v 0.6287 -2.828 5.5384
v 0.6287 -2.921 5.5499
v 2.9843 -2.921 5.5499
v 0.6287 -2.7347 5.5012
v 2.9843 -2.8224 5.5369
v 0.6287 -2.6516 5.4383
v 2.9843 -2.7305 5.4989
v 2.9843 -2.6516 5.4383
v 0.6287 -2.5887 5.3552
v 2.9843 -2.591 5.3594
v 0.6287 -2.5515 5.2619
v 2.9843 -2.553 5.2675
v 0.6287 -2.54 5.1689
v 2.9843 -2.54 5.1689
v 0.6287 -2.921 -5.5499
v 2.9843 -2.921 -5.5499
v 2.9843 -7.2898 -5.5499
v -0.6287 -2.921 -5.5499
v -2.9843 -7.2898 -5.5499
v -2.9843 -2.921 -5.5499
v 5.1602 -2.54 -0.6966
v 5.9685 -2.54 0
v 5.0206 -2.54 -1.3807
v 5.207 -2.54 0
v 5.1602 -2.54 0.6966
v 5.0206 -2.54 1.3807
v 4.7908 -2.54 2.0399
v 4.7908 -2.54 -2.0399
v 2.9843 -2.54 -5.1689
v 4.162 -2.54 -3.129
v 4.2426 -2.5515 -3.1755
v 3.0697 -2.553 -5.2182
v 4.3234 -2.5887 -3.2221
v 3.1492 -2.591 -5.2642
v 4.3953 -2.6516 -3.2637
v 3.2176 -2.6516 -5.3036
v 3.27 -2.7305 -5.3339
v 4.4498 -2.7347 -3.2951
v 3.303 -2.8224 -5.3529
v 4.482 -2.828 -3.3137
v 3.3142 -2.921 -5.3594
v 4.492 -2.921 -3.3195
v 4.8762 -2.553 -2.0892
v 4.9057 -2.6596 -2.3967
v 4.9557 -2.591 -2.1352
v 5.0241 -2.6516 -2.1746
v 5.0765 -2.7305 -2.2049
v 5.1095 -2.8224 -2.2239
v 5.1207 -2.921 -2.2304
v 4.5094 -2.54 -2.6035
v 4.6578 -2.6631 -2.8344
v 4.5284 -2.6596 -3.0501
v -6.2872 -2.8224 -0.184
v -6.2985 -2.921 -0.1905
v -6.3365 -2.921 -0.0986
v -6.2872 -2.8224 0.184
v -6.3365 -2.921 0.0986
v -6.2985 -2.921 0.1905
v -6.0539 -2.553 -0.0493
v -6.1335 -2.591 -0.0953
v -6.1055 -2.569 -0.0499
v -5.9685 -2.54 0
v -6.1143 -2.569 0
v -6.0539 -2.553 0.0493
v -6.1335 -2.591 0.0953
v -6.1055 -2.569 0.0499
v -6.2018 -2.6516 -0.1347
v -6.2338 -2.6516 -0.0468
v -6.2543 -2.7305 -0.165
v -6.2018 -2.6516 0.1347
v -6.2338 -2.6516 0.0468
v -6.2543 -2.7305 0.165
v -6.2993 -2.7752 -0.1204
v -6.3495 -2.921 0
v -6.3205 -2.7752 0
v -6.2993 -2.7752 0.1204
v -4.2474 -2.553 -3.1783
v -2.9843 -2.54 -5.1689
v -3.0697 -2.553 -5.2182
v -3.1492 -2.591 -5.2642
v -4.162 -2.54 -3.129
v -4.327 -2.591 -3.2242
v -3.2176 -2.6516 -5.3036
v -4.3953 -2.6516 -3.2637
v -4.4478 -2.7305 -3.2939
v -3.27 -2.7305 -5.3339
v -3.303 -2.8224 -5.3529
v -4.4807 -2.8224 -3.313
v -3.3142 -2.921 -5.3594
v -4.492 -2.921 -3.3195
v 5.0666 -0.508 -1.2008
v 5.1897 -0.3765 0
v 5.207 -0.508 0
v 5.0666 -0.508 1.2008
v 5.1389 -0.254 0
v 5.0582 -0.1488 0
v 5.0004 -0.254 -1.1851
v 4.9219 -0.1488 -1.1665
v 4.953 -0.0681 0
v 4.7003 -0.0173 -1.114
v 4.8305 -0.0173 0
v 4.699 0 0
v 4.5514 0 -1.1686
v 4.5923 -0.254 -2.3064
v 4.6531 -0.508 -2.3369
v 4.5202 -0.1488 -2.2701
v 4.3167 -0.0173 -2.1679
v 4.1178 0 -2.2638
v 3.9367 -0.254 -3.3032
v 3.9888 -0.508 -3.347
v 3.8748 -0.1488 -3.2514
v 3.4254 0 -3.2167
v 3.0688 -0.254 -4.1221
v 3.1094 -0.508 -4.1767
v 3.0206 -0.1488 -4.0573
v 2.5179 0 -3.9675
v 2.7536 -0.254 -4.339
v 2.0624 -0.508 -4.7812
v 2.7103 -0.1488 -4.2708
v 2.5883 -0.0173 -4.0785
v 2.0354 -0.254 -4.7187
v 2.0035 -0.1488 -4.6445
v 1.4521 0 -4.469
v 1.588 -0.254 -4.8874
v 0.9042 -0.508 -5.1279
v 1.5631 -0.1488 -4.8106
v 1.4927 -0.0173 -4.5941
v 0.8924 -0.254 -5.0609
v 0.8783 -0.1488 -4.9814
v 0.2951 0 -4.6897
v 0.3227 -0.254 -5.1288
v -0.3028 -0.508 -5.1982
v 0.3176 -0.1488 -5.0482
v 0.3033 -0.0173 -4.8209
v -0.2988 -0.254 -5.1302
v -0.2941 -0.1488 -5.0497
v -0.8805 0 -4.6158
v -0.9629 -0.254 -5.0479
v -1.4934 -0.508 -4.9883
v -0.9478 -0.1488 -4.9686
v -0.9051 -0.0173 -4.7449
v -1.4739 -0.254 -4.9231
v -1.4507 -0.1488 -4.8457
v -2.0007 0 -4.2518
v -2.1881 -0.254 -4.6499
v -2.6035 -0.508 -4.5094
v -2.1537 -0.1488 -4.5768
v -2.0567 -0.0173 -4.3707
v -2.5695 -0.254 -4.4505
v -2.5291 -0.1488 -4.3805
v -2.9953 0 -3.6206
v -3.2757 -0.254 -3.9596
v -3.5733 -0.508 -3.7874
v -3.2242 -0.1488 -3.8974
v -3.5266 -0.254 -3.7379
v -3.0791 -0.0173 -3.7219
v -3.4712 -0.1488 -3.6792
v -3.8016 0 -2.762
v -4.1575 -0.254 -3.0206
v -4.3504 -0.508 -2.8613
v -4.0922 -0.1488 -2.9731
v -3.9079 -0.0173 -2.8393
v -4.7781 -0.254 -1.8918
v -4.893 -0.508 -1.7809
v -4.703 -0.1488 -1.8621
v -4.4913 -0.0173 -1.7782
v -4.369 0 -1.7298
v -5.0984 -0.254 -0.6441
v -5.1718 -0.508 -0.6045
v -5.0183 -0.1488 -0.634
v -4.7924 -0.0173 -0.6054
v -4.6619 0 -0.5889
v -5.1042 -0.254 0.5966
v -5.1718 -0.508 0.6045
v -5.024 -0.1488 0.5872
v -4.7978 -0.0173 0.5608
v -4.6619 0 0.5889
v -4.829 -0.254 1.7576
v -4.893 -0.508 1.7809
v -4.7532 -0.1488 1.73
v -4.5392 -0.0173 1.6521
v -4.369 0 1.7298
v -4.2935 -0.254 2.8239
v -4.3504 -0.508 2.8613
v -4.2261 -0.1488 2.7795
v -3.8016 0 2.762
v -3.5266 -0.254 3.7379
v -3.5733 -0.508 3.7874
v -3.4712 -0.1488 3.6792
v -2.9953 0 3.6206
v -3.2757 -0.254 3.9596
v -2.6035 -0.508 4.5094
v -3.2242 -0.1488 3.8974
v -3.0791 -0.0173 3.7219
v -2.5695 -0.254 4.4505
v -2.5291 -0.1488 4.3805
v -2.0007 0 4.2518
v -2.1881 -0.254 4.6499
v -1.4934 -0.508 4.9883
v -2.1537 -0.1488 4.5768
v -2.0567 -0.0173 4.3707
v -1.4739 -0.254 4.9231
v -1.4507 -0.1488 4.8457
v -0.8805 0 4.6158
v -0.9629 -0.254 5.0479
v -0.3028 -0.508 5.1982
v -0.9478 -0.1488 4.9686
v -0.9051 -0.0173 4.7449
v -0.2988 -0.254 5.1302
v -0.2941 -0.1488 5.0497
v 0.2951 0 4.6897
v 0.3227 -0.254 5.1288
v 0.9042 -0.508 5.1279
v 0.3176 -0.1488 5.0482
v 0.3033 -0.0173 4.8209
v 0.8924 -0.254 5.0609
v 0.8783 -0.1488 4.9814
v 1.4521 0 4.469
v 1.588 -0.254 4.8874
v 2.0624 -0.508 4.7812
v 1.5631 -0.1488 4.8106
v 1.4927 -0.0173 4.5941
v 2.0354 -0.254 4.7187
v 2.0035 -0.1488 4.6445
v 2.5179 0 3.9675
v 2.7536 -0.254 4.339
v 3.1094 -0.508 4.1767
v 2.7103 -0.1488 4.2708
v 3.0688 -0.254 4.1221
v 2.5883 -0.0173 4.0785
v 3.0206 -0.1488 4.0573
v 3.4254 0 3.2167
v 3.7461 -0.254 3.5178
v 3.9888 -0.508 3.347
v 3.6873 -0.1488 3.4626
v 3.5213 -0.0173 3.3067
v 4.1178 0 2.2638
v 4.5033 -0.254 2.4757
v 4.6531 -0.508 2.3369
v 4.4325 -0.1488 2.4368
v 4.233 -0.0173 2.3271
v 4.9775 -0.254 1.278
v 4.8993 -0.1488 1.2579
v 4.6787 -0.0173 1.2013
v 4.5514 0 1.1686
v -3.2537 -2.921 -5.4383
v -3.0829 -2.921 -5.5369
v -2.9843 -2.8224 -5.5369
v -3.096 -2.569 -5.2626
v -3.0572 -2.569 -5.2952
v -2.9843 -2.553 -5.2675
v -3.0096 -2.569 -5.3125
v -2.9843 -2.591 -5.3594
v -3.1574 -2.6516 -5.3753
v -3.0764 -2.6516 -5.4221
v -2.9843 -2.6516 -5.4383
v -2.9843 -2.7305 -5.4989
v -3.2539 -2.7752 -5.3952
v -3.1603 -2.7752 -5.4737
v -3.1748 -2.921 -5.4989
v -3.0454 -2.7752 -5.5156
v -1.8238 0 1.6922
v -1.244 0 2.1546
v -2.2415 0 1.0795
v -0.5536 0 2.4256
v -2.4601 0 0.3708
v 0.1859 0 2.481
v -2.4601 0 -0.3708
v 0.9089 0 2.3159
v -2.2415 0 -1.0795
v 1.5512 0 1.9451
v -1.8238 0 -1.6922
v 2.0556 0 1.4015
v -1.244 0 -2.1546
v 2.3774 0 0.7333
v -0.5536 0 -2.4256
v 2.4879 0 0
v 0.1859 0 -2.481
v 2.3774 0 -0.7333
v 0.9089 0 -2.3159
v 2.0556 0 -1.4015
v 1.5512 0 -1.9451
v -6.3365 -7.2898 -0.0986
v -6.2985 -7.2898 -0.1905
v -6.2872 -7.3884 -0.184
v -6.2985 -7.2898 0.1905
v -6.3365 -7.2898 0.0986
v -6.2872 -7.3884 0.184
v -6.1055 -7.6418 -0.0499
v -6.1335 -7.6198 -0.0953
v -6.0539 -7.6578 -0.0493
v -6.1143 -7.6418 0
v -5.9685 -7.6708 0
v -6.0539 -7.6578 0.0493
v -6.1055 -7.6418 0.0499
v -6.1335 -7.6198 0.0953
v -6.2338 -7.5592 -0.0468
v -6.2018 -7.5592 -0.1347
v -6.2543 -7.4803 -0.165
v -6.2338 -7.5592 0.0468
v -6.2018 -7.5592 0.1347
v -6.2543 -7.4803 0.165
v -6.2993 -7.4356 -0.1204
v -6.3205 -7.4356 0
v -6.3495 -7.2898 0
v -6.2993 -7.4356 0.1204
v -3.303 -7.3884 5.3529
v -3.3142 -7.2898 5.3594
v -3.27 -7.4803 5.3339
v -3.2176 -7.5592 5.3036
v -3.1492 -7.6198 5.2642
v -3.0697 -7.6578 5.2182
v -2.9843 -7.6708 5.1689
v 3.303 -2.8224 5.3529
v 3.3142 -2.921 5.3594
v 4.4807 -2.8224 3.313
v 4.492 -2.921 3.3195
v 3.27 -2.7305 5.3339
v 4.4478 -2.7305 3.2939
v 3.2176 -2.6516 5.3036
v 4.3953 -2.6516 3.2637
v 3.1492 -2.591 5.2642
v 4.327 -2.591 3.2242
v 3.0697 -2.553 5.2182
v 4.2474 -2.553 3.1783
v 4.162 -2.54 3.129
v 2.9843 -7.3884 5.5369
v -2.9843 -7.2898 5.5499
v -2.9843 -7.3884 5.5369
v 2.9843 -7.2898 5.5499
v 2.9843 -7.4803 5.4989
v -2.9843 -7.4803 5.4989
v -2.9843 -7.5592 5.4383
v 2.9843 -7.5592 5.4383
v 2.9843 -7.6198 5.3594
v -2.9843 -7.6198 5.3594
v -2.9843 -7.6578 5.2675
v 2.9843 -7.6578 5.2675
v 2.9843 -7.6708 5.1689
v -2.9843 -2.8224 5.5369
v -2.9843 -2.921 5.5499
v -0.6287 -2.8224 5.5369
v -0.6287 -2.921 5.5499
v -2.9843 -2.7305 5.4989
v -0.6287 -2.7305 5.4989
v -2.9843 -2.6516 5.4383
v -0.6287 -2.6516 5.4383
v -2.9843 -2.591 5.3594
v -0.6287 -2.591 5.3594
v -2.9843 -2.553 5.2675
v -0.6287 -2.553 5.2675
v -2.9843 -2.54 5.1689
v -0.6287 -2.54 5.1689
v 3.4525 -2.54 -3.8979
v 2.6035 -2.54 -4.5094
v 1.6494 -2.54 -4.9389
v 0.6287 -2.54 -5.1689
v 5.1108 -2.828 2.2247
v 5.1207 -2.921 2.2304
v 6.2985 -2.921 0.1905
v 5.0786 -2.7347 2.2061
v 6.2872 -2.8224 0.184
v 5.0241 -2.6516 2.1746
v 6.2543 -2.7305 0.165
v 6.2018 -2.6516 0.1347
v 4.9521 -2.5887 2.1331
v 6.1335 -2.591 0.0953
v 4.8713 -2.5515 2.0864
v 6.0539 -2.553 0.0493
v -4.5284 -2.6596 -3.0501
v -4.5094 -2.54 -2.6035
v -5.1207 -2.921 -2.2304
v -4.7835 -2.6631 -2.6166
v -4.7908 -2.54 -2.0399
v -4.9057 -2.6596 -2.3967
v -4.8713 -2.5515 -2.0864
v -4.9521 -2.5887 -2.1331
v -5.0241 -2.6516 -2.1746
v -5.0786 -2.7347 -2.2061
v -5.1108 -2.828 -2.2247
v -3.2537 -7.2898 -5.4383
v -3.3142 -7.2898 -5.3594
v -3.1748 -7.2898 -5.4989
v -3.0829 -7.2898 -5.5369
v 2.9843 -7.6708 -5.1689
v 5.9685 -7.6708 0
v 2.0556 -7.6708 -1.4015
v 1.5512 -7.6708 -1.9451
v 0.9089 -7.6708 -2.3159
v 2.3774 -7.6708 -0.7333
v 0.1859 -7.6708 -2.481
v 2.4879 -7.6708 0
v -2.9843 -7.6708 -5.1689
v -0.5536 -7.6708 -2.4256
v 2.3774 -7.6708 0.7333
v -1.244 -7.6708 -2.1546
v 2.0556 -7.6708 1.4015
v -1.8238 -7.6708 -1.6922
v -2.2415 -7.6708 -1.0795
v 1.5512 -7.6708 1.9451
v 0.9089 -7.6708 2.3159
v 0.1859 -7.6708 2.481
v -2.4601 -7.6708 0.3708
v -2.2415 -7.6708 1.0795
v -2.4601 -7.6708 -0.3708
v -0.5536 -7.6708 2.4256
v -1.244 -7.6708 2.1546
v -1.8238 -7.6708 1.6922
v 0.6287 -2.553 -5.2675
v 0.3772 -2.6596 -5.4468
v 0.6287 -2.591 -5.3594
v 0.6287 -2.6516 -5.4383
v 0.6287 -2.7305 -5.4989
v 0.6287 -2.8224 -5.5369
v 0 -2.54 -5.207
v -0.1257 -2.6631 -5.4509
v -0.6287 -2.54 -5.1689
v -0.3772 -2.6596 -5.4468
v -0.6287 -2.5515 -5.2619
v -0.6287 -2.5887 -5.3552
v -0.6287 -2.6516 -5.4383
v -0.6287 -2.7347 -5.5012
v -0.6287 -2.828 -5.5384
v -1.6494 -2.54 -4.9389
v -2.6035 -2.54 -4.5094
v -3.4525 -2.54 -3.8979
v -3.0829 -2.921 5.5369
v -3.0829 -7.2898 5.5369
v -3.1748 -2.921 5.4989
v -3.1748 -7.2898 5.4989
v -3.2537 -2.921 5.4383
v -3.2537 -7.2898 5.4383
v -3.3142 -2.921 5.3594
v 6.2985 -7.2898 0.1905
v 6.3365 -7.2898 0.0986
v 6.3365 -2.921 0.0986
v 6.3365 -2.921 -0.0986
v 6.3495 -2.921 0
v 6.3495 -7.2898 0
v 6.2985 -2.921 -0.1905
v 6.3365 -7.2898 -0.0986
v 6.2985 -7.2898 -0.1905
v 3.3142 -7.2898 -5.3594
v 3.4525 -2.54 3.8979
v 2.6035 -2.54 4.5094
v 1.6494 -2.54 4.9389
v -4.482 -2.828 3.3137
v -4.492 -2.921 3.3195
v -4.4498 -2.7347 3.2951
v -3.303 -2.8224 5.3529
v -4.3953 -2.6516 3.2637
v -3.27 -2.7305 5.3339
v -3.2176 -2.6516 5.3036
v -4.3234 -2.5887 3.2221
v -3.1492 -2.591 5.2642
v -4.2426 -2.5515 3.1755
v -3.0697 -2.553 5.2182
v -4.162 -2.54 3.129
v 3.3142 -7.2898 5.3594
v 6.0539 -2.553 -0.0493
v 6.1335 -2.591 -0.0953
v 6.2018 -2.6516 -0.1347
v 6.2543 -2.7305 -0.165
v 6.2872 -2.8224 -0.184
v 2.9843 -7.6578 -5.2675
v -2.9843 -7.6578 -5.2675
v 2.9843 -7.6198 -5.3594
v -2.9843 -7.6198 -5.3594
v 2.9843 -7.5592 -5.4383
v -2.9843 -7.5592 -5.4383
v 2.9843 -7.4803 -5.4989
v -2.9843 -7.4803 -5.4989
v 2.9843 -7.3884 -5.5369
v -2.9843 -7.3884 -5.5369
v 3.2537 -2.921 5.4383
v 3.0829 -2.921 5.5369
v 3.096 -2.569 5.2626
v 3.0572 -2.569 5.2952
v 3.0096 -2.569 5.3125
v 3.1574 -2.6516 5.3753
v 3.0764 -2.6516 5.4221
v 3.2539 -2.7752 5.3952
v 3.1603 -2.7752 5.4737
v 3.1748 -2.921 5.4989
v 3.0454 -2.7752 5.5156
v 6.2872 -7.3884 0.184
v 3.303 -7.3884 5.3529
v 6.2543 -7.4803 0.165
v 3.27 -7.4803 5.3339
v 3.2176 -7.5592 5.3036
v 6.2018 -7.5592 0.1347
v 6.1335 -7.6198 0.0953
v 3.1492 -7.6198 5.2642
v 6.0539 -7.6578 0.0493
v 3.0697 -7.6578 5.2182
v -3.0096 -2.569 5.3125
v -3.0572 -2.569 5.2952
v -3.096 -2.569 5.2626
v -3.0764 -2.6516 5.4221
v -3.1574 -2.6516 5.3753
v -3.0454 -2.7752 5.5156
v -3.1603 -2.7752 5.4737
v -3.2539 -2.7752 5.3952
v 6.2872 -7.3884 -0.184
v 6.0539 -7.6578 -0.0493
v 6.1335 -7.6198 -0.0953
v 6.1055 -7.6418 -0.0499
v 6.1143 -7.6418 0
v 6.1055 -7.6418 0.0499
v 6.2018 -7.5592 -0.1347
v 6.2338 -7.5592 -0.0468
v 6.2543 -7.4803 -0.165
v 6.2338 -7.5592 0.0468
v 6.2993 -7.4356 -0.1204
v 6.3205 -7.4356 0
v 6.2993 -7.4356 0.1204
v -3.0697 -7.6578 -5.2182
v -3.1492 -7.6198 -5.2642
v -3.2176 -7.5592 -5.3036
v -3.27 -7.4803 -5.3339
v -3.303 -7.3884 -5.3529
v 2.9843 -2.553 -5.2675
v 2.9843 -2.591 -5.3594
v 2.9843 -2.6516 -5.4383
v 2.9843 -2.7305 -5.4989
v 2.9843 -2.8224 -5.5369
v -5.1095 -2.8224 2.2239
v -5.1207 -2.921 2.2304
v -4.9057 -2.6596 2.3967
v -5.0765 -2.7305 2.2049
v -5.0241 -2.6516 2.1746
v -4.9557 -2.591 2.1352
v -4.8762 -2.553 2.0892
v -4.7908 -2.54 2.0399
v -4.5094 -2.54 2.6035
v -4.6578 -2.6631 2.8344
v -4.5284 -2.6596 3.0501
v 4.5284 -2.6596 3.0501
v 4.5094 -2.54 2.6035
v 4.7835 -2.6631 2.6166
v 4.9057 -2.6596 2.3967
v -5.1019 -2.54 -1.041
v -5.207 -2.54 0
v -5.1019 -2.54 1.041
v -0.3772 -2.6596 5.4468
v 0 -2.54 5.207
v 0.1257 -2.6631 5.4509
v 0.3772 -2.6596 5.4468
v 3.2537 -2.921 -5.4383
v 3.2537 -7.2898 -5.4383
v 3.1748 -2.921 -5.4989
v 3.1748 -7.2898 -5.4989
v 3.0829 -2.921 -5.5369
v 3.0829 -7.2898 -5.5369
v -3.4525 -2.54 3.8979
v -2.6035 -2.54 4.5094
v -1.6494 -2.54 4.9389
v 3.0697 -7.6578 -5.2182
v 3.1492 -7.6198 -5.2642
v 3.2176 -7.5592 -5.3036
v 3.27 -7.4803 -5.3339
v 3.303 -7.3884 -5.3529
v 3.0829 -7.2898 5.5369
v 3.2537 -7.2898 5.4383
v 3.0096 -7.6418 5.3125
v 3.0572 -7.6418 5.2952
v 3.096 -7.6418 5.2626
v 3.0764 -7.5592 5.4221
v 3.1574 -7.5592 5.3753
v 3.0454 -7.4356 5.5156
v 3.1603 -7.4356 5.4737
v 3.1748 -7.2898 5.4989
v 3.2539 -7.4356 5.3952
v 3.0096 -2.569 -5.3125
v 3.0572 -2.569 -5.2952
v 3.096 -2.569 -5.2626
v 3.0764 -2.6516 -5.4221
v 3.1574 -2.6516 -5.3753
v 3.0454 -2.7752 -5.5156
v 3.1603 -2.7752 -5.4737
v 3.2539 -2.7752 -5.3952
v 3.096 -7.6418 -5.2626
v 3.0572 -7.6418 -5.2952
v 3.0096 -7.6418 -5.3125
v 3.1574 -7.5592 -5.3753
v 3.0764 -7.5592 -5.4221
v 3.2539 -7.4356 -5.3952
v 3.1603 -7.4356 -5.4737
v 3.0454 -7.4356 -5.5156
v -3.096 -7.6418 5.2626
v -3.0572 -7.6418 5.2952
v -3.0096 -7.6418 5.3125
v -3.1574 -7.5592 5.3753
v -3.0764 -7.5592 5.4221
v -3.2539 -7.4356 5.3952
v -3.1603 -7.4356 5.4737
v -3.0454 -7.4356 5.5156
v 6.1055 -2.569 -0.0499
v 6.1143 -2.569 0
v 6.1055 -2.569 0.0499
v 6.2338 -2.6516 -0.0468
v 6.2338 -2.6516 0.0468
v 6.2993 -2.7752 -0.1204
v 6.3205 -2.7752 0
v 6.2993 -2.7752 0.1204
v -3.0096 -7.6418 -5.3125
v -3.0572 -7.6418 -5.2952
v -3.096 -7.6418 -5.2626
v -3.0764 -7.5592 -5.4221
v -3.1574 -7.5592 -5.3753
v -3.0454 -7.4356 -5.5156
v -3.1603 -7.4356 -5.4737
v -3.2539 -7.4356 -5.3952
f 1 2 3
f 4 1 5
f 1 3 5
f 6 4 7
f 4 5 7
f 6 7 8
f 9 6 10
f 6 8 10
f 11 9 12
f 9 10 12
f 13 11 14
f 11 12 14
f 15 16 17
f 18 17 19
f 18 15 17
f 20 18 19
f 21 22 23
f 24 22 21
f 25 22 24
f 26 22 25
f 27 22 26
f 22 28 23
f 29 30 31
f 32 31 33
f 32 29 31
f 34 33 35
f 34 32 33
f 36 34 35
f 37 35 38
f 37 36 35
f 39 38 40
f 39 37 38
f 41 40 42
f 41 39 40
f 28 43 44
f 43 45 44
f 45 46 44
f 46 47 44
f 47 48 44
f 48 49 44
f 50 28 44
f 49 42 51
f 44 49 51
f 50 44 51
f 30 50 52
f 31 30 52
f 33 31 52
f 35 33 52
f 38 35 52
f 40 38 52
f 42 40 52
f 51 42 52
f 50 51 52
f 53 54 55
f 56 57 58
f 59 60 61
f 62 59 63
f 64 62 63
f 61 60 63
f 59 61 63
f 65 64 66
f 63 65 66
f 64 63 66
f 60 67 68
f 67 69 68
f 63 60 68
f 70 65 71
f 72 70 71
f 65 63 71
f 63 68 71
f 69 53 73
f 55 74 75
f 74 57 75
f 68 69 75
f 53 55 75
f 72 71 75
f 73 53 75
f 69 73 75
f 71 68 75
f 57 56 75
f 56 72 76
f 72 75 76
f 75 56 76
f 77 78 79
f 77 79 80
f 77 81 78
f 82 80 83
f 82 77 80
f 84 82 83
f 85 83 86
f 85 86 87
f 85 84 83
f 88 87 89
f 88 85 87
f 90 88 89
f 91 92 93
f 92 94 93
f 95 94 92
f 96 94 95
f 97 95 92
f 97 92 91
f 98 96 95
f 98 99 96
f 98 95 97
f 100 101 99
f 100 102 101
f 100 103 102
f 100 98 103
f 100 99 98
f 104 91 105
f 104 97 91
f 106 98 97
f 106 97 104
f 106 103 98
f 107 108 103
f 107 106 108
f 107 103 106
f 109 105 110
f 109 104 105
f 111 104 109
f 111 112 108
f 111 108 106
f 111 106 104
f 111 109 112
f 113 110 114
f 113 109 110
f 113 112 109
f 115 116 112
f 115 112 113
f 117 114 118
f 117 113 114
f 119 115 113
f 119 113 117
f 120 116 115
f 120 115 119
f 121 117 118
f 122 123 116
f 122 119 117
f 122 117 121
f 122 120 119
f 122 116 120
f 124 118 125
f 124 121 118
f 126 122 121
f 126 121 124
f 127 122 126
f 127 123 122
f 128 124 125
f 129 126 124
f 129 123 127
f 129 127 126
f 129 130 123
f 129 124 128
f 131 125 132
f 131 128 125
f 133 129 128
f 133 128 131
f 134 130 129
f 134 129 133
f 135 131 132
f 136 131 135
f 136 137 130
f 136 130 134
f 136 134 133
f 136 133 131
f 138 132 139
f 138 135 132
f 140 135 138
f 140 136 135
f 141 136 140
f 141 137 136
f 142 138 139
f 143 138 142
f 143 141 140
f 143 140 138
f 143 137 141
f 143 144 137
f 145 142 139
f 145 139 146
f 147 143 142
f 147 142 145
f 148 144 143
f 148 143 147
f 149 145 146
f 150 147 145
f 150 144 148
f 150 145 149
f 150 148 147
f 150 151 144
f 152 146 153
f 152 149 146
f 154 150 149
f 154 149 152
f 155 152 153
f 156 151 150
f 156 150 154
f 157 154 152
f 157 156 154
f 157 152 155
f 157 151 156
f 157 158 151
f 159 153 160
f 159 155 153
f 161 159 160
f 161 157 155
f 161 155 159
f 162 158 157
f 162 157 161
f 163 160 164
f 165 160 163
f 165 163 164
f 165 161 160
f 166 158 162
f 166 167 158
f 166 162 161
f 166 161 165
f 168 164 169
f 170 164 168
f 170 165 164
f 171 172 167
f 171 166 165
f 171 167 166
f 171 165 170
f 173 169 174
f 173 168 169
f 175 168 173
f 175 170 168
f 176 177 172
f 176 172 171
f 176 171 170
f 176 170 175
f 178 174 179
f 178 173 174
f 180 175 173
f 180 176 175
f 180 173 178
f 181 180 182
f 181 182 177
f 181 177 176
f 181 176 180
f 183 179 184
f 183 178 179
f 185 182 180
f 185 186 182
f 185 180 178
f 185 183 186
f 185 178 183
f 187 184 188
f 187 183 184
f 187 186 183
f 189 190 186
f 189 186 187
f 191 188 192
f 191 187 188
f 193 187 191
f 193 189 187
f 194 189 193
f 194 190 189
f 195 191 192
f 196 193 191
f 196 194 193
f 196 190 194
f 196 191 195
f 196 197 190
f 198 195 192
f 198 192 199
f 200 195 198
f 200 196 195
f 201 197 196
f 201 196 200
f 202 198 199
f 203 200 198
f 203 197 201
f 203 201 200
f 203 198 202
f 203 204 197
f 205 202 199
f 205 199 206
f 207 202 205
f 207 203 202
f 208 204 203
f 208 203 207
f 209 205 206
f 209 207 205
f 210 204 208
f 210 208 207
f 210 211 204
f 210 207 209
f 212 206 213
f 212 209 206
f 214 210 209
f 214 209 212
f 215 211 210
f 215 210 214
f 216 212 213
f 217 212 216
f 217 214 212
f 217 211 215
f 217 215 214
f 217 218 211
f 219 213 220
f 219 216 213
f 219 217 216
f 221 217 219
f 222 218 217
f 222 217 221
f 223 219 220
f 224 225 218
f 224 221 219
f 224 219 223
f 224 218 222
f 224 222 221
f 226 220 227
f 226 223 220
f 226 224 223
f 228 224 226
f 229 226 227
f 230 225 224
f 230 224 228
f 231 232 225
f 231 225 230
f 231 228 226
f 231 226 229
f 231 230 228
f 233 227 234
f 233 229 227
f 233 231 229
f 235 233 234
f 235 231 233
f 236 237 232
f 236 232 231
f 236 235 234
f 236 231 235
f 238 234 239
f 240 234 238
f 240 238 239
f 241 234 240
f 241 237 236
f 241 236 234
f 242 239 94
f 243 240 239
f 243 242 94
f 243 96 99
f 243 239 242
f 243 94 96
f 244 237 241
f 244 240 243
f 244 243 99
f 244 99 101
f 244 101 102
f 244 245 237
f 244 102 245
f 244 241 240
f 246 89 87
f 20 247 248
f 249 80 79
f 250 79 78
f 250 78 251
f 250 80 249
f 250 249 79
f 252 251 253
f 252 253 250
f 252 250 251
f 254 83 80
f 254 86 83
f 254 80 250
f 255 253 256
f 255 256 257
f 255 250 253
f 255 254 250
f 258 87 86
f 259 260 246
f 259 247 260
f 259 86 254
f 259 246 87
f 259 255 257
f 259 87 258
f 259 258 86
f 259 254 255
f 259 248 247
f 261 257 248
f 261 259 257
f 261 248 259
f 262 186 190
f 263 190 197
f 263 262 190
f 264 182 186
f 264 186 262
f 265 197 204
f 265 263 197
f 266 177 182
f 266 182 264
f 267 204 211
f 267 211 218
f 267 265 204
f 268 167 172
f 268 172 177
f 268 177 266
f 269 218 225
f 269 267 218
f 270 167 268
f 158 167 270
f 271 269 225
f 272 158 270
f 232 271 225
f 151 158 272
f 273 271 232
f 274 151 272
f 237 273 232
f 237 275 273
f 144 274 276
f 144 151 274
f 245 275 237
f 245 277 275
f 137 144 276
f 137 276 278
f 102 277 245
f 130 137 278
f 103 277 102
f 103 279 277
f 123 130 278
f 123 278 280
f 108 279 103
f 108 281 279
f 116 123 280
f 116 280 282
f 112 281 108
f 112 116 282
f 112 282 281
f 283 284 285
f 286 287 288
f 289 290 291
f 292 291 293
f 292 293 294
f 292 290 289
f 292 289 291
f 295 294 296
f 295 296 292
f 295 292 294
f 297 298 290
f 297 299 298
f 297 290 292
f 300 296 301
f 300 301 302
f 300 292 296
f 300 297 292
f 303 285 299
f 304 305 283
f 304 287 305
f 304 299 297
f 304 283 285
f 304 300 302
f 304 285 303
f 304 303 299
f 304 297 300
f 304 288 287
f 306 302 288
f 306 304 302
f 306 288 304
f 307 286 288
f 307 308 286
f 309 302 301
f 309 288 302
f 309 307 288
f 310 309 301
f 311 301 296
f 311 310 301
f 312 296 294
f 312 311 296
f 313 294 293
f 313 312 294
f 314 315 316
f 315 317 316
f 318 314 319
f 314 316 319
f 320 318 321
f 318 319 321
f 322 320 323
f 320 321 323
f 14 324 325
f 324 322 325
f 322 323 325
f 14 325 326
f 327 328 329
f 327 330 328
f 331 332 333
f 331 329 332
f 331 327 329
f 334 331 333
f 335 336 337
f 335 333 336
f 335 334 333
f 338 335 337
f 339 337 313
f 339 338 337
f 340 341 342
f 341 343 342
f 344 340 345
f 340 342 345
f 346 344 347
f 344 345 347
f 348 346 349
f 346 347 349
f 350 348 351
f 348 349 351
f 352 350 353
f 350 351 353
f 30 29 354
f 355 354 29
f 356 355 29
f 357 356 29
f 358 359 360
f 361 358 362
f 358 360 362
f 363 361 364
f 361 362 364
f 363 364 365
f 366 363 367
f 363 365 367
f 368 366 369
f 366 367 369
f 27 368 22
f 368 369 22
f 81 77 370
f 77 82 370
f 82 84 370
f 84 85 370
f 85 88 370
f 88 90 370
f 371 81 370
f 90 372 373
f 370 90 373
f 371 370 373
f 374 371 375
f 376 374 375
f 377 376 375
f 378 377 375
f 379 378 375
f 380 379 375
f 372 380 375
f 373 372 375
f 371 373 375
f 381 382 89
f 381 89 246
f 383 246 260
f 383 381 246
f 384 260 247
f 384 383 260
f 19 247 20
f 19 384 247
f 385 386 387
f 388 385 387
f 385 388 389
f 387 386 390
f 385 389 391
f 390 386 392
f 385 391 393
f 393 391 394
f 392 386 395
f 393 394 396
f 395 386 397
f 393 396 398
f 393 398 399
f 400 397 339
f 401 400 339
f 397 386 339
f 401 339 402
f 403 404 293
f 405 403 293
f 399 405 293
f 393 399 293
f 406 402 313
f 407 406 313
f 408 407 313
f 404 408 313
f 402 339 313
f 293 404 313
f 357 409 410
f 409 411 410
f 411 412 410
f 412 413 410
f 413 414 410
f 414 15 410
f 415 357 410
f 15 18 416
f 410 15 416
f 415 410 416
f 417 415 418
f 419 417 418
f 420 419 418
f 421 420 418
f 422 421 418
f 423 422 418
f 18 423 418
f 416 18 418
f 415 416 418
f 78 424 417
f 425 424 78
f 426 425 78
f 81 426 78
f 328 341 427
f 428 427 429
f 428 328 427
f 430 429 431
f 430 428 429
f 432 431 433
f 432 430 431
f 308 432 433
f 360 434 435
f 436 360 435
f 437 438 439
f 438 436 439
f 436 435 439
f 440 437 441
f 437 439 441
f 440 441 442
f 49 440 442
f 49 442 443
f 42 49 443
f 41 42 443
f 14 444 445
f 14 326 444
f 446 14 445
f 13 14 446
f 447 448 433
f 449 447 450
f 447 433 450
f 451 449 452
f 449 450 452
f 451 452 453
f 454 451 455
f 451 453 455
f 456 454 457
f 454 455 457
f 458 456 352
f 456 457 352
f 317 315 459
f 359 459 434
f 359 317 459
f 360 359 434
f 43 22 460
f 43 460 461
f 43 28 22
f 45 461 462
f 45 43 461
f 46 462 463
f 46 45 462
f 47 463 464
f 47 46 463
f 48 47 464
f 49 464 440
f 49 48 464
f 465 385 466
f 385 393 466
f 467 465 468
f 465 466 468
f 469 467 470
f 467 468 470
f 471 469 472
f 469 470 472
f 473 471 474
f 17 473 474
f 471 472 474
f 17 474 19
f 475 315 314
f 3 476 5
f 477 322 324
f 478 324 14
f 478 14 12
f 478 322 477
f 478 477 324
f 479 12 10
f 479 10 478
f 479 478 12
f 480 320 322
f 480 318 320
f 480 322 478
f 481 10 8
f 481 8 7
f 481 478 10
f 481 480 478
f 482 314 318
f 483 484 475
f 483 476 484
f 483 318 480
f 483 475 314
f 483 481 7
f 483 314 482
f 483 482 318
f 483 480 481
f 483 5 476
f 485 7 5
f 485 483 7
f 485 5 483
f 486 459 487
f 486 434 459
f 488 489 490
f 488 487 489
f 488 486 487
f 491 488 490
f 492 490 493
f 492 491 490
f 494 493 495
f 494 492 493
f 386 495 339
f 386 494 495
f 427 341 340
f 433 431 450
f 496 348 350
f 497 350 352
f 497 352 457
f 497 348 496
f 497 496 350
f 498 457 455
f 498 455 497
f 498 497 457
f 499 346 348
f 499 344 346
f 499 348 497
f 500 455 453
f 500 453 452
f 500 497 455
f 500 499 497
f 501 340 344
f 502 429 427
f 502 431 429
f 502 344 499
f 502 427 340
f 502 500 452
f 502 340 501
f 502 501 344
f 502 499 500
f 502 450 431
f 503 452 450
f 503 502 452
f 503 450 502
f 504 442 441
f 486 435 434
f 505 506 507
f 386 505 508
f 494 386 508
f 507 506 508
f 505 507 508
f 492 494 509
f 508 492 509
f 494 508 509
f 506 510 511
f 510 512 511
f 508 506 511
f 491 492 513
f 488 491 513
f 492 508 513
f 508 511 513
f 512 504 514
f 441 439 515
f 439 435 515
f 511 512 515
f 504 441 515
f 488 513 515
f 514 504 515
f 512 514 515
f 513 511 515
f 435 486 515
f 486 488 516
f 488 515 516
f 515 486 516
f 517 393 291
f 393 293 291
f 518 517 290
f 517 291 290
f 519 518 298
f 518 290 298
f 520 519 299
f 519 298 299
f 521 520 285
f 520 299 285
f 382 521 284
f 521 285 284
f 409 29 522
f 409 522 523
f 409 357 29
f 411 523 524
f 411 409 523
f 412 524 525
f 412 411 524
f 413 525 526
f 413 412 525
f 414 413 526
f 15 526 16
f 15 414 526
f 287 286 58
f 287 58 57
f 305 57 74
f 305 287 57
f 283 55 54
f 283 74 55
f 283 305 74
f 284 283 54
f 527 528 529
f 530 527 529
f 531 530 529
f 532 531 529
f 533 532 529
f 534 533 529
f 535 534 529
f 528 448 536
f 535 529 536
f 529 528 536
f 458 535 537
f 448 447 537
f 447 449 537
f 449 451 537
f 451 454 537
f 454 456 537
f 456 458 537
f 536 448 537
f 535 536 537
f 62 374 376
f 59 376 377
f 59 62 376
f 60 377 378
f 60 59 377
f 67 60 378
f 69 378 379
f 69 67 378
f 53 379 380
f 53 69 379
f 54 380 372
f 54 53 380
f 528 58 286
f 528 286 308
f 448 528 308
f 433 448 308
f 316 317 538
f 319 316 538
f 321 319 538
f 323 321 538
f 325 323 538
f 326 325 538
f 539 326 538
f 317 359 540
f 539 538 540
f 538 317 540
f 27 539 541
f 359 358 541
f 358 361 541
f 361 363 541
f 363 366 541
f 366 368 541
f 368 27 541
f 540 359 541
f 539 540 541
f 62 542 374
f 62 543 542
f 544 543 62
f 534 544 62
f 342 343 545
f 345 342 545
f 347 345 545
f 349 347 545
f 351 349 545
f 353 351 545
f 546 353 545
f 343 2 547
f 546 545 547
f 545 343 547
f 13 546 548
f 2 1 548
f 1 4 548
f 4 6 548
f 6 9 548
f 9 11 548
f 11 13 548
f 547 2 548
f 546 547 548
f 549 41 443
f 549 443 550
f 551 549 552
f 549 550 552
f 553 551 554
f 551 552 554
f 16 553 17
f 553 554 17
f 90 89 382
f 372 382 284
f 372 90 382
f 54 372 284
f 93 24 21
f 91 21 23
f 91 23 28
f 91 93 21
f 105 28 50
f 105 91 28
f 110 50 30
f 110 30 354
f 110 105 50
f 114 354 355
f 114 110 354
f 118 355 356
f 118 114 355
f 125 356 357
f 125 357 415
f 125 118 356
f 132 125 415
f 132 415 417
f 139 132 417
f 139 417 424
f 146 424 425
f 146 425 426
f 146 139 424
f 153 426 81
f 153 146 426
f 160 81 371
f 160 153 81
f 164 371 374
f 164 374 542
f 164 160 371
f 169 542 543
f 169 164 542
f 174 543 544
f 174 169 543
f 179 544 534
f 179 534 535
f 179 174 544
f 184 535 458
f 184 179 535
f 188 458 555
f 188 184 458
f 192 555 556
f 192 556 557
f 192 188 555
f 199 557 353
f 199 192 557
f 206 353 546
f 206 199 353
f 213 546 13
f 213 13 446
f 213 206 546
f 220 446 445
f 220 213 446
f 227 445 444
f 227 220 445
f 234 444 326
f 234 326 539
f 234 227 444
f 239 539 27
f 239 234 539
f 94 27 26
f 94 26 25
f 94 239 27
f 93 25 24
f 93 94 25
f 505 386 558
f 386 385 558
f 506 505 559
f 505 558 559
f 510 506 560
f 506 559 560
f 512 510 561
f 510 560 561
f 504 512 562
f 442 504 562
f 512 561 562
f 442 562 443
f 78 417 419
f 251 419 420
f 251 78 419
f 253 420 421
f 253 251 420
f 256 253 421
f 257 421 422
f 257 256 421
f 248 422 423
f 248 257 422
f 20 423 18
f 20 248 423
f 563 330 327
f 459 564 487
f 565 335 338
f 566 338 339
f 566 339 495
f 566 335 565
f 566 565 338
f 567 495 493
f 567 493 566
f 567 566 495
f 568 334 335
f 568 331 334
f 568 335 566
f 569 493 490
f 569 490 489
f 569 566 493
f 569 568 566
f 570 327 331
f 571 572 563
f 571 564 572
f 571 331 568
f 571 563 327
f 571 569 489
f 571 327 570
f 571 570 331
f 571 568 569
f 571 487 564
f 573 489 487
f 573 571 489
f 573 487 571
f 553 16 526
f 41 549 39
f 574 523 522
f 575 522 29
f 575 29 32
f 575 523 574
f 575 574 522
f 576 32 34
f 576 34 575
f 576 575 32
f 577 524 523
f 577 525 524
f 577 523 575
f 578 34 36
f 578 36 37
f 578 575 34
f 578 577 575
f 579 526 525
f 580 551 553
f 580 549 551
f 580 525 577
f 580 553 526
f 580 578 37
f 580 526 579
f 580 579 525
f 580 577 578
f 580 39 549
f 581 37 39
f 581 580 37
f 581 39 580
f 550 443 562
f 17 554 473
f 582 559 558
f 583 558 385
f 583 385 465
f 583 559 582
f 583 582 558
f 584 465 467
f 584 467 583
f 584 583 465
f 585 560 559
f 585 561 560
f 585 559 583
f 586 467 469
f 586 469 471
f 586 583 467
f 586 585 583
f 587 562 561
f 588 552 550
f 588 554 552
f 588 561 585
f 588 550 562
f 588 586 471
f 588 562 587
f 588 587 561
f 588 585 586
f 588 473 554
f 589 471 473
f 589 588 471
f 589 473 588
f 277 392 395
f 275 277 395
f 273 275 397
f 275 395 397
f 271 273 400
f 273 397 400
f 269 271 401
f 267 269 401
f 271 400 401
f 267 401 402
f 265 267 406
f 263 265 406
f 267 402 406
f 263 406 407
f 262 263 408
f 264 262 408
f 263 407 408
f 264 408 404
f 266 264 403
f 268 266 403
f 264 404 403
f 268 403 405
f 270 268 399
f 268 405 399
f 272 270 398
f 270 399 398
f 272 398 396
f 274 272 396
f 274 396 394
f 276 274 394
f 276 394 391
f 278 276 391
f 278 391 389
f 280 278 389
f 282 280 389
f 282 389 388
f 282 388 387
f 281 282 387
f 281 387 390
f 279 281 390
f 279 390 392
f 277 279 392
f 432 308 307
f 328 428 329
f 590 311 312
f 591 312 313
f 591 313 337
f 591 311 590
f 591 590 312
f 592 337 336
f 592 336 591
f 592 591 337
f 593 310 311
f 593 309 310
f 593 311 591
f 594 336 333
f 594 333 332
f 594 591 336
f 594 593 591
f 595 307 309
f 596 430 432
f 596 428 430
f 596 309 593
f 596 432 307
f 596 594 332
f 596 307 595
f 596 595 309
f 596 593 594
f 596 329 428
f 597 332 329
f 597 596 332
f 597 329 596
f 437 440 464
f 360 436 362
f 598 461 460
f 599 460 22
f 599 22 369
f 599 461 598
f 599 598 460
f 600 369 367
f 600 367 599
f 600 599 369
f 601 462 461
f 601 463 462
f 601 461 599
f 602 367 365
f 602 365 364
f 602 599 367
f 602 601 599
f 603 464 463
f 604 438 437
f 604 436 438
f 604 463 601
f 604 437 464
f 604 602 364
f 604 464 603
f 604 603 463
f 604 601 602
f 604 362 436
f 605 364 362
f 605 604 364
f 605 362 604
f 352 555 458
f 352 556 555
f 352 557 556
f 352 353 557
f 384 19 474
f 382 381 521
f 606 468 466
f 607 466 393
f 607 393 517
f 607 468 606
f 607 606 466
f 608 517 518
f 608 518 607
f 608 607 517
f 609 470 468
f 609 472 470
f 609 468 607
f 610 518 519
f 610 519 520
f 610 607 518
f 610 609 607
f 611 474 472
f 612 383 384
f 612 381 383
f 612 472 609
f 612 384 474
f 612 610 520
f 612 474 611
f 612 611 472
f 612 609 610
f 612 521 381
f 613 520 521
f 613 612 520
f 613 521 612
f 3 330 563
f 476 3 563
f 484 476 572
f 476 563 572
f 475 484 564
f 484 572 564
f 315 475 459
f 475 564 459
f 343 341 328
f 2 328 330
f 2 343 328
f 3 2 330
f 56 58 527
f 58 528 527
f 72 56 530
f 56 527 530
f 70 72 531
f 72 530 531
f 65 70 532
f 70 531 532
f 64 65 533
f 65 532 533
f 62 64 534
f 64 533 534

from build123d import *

# Parameters (mm, degrees)
EXTRUDE1_DEPTH = 5.1308
SKETCH2_W      = 5.207
SKETCH2_H      = 2.54
HOLEWZD1_D     = 4.97586
HOLEWZD1_DEPTH = 7.6708
FILLET1_R      = 0.381
FILLET2_R      = 0.508


with BuildPart() as part:
    # Sketch1 → Extrude1 (new body)
    with BuildSketch(Plane(origin=(0, -2.54, 0), x_dir=(-1, 0, 0), z_dir=(0, 1, 0))):
        Polygon((3.204236259, 5.5499), (-3.204236259, 5.5499), (-6.408472518, 0), (-3.204236259, -5.5499), (3.204236259, -5.5499), (6.408472518, 0), align=None)
    extrude(amount=-EXTRUDE1_DEPTH)

    # Sketch2 → Revolve1 (revolve)
    with BuildSketch(Plane(origin=(0, 0, 0), x_dir=(-1, 0, 0), z_dir=(0, 0, -1))):
        with Locations((-2.6035, -1.27)):
            Rectangle(SKETCH2_W, SKETCH2_H)
    revolve(axis=Axis((0, -2.54, 0), (0, 1, 0)))

    # HoleWzd1
    with Locations(Plane(origin=(0, 0, 0), x_dir=(-1, 0, 0), z_dir=(0, 1, 0))):
        with Locations((0, 0)):
            Hole(HOLEWZD1_D / 2, depth=HOLEWZD1_DEPTH)

    # Fillet1
    fillet1_edges = [part.edges().sort_by_distance(p)[0] for p in [
        (4.806354388, -7.6708, 2.77495),
        (-6.408472518, -5.1054, 0),
        (-3.204236259, -5.1054, -5.5499),
        (3.204236259, -5.1054, -5.5499),
        (6.408472518, -5.1054, 0),
        (3.204236259, -5.1054, 5.5499),
        (-3.204236259, -5.1054, 5.5499),
        (4.806354388, -7.6708, -2.77495),
        (0, -7.6708, -5.5499),
        (-4.806354388, -7.6708, -2.77495),
        (-4.806354388, -7.6708, 2.77495),
        (-4.806354388, -2.54, -2.77495),
        (0, -2.54, -5.5499),
        (4.806354388, -2.54, -2.77495),
        (0, -7.6708, 5.5499),
        (4.806354388, -2.54, 2.77495),
        (0, -2.54, 5.5499),
        (-4.806354388, -2.54, 2.77495),
    ]]
    fillet(fillet1_edges, radius=FILLET1_R)

    # Fillet2
    fillet2_edges = [part.edges().sort_by_distance(p)[0] for p in [
        (-5.207, 0, 0),
    ]]
    fillet(fillet2_edges, radius=FILLET2_R)


solid = part.part
